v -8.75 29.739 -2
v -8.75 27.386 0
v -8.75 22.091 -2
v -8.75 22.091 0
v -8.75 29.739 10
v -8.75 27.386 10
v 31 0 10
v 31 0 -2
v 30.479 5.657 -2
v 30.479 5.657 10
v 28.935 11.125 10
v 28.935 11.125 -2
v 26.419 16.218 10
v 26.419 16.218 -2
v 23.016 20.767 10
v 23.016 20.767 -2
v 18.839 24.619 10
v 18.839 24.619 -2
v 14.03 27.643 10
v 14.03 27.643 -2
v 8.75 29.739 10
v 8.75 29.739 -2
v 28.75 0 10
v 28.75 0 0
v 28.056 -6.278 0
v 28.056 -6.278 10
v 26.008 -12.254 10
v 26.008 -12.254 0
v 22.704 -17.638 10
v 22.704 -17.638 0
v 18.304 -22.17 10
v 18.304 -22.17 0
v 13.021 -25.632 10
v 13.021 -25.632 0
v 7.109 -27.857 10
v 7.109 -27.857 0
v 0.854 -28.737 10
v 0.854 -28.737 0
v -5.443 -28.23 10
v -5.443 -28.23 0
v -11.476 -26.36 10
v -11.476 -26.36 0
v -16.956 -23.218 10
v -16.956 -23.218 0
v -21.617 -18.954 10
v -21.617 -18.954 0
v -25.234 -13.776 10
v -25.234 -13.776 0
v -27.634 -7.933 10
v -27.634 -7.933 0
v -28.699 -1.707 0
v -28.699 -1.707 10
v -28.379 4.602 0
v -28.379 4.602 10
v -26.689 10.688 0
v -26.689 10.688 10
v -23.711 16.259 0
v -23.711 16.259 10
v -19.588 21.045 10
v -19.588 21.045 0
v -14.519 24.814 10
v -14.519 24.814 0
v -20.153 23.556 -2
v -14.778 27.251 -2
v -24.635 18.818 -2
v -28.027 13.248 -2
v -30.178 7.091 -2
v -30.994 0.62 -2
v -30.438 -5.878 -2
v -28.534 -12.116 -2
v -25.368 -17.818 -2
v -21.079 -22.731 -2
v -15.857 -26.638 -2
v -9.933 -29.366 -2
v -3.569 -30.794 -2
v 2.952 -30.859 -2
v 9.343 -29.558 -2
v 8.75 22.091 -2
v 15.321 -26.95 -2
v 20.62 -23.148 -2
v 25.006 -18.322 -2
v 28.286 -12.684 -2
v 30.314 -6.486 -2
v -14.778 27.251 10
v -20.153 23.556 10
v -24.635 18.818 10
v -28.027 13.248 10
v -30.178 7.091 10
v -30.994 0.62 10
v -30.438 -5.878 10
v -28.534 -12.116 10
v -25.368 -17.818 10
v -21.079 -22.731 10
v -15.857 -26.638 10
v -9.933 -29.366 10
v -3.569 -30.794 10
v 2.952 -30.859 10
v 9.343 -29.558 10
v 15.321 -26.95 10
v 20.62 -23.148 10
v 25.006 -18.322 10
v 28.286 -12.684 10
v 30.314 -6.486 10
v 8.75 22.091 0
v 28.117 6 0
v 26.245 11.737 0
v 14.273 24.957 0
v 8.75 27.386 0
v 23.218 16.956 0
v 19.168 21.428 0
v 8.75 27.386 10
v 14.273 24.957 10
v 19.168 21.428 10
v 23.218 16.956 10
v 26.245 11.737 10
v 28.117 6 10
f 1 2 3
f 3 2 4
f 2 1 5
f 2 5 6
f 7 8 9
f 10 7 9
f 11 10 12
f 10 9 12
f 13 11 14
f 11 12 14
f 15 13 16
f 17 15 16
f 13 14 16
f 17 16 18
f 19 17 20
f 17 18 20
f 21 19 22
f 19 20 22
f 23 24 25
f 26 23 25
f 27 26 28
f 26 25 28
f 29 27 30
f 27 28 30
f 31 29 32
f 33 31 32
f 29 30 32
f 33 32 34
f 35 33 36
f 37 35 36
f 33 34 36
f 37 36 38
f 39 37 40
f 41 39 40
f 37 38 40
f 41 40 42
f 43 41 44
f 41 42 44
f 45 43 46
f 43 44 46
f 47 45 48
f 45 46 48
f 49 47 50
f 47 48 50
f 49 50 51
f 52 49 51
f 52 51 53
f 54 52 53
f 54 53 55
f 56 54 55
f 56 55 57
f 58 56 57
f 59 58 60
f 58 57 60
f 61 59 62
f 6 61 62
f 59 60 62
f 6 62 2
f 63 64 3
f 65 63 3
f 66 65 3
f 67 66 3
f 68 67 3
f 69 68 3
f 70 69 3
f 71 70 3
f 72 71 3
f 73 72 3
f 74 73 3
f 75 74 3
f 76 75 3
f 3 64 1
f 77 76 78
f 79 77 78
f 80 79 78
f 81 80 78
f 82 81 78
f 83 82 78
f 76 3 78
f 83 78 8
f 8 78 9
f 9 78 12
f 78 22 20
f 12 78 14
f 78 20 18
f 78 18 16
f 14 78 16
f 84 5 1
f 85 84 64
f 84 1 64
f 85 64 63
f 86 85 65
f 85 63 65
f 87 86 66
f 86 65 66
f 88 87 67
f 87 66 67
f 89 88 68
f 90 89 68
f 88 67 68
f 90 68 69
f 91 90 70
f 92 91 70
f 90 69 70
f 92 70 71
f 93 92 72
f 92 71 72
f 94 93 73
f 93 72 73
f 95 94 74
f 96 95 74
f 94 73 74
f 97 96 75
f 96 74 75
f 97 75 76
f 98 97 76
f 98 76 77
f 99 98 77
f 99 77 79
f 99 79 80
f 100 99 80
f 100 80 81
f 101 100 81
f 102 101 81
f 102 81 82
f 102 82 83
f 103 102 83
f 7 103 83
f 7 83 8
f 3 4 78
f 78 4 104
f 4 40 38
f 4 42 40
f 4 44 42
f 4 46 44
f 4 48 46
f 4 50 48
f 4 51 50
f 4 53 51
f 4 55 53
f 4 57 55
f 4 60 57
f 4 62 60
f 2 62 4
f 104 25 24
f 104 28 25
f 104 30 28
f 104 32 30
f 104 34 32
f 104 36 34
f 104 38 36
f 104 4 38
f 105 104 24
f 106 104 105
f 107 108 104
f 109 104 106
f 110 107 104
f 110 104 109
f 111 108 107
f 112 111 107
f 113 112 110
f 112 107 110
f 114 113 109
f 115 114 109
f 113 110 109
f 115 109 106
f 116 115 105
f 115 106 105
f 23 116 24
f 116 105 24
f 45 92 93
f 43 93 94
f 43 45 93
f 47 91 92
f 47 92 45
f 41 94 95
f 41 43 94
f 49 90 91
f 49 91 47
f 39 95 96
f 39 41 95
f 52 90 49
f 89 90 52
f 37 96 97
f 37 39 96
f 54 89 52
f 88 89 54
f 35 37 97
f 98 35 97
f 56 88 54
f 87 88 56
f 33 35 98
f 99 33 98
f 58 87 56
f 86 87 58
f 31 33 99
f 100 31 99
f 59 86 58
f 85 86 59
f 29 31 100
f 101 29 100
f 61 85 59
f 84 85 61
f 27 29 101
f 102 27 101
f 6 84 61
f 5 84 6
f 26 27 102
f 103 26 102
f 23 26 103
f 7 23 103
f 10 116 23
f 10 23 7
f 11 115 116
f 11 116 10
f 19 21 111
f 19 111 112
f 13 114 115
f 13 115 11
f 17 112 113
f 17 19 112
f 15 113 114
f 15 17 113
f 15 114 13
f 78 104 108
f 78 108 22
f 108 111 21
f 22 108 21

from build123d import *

# Parameters (mm, degrees)
F1_DEPTH      = 2
F2_DEPTH      = 10
F3_DEPTH      = 2.001
F4_DEPTH      = 25
F4_DEPTH_BACK = 25


with BuildPart() as f1:
    # F0 (on Top) → F1 (new body)
    with BuildSketch(Plane.XY):
        with BuildLine():
            Line((8.75, 27.3861278753), (8.75, 29.7394939432))
            ThreePointArc((8.75, 29.7394939432), (0, 31), (-8.75, 29.7394939432))
            Line((-8.75, 29.7394939432), (-8.75, 27.3861278753))
            ThreePointArc((-8.75, 27.3861278753), (0, 28.75), (8.75, 27.3861278753))
        make_face()
        with BuildLine():
            ThreePointArc((-8.75, 29.7394939432), (-18.5708104293, -24.821865361), (31, 0))
            ThreePointArc((31, 0), (24.821865361, 18.5708104293), (8.75, 29.7394939432))
            Line((8.75, 29.7394939432), (8.75, 27.3861278753))
            ThreePointArc((8.75, 27.3861278753), (23.2177195263, 16.9558249578), (28.75, 0))
            ThreePointArc((28.75, 0), (-16.9558249578, -23.2177195263), (-8.75, 27.3861278753))
            Line((-8.75, 27.3861278753), (-8.75, 29.7394939432))
        make_face()
        with BuildLine():
            Line((8.75, 22.0912080258), (8.75, 27.3861278753))
            ThreePointArc((8.75, 27.3861278753), (0, 28.75), (-8.75, 27.3861278753))
            Line((-8.75, 27.3861278753), (-8.75, 22.0912080258))
            Line((-8.75, 22.0912080258), (8.75, 22.0912080258))
        make_face()
        with BuildLine():
            ThreePointArc((28.75, 0), (23.2177195263, 16.9558249578), (8.75, 27.3861278753))
            Line((8.75, 27.3861278753), (8.75, 22.0912080258))
            Line((8.75, 22.0912080258), (-8.75, 22.0912080258))
            Line((-8.75, 22.0912080258), (-8.75, 27.3861278753))
            ThreePointArc((-8.75, 27.3861278753), (-16.9558249578, -23.2177195263), (28.75, 0))
        make_face()
    extrude(amount=-F1_DEPTH)

    # F0 (on Top) → F2 (join)
    with BuildSketch(Plane.XY):
        with BuildLine():
            Line((8.75, 27.3861278753), (8.75, 29.7394939432))
            ThreePointArc((8.75, 29.7394939432), (0, 31), (-8.75, 29.7394939432))
            Line((-8.75, 29.7394939432), (-8.75, 27.3861278753))
            ThreePointArc((-8.75, 27.3861278753), (0, 28.75), (8.75, 27.3861278753))
        make_face()
        with BuildLine():
            ThreePointArc((-8.75, 29.7394939432), (-18.5708104293, -24.821865361), (31, 0))
            ThreePointArc((31, 0), (24.821865361, 18.5708104293), (8.75, 29.7394939432))
            Line((8.75, 29.7394939432), (8.75, 27.3861278753))
            ThreePointArc((8.75, 27.3861278753), (23.2177195263, 16.9558249578), (28.75, 0))
            ThreePointArc((28.75, 0), (-16.9558249578, -23.2177195263), (-8.75, 27.3861278753))
            Line((-8.75, 27.3861278753), (-8.75, 29.7394939432))
        make_face()
    extrude(amount=F2_DEPTH)

    # F0 (on Top) → F3 (cut, through all)
    with BuildSketch(Plane.XY):
        with BuildLine():
            Line((8.75, 22.0912080258), (8.75, 27.3861278753))
            ThreePointArc((8.75, 27.3861278753), (0, 28.75), (-8.75, 27.3861278753))
            Line((-8.75, 27.3861278753), (-8.75, 22.0912080258))
            Line((-8.75, 22.0912080258), (8.75, 22.0912080258))
        make_face()
        with BuildLine():
            ThreePointArc((-8.75, 29.7394939432), (0, 31), (8.75, 29.7394939432))
            Line((8.75, 29.7394939432), (8.75, 35.3688262403))
            Line((8.75, 35.3688262403), (-8.75, 35.3688262403))
            Line((-8.75, 35.3688262403), (-8.75, 29.7394939432))
        make_face()
        with BuildLine():
            Line((8.75, 27.3861278753), (8.75, 29.7394939432))
            ThreePointArc((8.75, 29.7394939432), (0, 31), (-8.75, 29.7394939432))
            Line((-8.75, 29.7394939432), (-8.75, 27.3861278753))
            ThreePointArc((-8.75, 27.3861278753), (0, 28.75), (8.75, 27.3861278753))
        make_face()
    extrude(amount=-F3_DEPTH, mode=Mode.SUBTRACT)

    # F0 (on Top) → F4 (cut, two sides)
    with BuildSketch(Plane.XY) as f4_sk:
        with BuildLine():
            Line((8.75, 27.3861278753), (8.75, 29.7394939432))
            ThreePointArc((8.75, 29.7394939432), (0, 31), (-8.75, 29.7394939432))
            Line((-8.75, 29.7394939432), (-8.75, 27.3861278753))
            ThreePointArc((-8.75, 27.3861278753), (0, 28.75), (8.75, 27.3861278753))
        make_face()
    extrude(amount=-F4_DEPTH, mode=Mode.SUBTRACT)
    extrude(f4_sk.sketch, amount=F4_DEPTH_BACK, mode=Mode.SUBTRACT)


solid = f1.part
